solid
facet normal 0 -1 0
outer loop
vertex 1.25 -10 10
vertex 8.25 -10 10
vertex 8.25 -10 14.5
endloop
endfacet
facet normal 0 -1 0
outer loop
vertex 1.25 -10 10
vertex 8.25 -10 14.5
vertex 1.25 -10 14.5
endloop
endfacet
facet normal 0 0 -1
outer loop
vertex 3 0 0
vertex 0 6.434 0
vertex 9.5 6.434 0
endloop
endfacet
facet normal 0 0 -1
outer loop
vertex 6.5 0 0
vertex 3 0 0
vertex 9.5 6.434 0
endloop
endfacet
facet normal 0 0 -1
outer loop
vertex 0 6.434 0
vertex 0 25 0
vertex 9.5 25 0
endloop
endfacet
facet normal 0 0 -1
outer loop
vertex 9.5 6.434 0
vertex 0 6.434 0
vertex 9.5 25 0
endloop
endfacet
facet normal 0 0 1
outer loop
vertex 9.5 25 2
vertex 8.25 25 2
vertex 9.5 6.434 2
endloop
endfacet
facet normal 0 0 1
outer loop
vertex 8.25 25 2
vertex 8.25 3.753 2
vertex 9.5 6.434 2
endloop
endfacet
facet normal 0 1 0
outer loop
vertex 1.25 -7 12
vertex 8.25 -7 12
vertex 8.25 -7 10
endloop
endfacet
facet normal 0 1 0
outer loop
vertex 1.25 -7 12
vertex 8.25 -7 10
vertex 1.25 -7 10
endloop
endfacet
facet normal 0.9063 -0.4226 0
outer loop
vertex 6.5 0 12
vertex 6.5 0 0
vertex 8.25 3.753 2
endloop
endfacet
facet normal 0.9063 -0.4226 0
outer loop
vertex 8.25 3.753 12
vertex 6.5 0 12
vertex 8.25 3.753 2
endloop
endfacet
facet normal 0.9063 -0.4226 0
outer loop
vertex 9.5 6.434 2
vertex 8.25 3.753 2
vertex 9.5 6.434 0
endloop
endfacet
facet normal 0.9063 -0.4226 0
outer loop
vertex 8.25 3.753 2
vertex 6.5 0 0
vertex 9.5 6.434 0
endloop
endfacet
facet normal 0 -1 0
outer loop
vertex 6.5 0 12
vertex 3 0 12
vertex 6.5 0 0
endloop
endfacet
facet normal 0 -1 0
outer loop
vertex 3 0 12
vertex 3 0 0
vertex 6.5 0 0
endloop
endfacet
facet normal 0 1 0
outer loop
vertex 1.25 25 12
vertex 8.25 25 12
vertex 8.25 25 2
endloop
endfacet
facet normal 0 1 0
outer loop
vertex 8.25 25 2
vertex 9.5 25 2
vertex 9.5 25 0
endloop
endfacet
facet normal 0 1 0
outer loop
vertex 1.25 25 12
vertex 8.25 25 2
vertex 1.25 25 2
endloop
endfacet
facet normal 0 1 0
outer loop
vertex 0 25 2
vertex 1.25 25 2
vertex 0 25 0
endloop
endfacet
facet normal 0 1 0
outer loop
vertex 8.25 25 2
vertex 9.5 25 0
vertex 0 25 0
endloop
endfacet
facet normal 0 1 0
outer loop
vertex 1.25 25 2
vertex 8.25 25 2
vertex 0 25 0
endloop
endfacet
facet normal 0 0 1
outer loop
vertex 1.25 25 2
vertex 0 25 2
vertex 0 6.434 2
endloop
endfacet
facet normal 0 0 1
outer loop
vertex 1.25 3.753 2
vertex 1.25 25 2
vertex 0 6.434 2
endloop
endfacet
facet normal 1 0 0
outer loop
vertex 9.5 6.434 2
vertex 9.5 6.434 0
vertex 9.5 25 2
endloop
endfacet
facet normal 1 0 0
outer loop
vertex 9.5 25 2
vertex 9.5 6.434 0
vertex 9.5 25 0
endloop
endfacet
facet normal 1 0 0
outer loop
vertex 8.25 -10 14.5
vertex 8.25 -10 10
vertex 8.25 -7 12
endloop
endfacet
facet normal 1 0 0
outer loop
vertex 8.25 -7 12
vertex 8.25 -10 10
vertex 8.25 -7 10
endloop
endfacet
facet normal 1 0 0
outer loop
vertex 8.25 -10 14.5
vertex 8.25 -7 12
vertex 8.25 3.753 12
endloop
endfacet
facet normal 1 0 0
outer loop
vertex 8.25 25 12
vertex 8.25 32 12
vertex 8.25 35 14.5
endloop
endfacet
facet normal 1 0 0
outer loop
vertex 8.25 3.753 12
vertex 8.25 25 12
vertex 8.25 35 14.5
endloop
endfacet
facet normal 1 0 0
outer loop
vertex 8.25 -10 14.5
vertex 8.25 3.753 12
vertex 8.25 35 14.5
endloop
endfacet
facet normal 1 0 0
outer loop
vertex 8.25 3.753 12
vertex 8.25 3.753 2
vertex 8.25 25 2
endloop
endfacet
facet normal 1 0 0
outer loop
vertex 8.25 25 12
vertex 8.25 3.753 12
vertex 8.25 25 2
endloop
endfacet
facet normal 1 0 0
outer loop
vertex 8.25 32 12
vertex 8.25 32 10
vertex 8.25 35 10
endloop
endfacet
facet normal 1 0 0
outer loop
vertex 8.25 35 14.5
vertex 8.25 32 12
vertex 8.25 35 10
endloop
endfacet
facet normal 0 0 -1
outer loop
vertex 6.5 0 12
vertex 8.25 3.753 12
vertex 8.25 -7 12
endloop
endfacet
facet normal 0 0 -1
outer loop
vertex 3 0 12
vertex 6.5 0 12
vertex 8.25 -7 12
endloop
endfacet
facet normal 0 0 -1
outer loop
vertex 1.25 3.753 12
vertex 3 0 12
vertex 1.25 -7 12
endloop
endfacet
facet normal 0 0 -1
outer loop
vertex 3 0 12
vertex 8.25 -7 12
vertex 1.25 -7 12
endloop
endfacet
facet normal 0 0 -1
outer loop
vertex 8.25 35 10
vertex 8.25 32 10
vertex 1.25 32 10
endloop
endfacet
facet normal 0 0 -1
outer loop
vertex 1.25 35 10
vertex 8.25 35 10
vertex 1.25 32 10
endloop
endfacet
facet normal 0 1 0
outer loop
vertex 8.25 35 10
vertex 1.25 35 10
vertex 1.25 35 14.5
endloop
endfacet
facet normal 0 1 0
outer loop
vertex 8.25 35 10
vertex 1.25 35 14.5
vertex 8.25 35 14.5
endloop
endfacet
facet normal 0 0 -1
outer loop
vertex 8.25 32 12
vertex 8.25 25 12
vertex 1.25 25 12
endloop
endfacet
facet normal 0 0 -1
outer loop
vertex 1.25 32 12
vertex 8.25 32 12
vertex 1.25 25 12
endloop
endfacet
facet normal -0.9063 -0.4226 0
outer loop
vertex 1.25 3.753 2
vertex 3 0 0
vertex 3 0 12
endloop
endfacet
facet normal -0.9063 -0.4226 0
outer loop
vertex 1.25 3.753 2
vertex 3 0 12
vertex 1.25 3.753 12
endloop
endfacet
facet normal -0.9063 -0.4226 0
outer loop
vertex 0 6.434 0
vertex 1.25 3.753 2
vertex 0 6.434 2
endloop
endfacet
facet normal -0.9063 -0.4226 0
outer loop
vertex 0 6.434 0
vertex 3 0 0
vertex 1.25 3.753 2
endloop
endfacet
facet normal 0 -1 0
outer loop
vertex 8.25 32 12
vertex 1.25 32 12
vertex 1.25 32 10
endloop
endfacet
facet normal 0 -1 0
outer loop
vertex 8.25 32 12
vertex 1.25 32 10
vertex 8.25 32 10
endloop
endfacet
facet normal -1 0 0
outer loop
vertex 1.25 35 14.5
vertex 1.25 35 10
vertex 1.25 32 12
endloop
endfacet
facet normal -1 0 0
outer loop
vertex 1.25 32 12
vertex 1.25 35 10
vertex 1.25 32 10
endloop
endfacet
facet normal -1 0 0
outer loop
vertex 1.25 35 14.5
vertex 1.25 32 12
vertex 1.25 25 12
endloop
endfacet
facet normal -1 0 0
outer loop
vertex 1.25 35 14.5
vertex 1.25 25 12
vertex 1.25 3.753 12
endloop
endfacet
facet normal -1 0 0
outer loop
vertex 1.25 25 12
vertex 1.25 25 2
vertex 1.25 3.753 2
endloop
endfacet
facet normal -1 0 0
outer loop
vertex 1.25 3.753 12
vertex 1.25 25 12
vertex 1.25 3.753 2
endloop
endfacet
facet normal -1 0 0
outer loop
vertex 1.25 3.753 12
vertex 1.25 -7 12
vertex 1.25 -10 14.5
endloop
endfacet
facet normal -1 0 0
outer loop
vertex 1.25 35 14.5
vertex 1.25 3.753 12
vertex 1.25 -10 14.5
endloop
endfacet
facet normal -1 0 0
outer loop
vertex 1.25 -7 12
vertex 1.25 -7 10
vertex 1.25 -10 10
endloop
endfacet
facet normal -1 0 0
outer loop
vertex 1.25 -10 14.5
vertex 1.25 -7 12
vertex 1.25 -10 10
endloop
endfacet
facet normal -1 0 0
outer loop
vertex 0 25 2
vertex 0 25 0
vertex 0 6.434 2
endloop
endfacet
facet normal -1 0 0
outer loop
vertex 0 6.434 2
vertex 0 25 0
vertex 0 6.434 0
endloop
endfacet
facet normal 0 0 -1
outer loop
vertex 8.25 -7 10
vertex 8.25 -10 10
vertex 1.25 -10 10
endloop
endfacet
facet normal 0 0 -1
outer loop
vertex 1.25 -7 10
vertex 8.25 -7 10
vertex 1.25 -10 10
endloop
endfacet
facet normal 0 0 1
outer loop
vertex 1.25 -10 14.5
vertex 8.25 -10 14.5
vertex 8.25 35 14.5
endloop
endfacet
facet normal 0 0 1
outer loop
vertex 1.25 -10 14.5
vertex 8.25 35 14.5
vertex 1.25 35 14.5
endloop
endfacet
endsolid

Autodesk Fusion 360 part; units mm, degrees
sketch "Sketch1" plane through (0, 0, 0) normal (0, 0, 1) x (1, 0, 0)
  line L0 (0, 0) -> (9.5, 0)
  line L1 (9.5, 0) -> (9.5, 25)
  line L2 (9.5, 25) -> (0, 25)
  line L3 (0, 25) -> (0, 0)
  line L4 (1.25, 25) -> (8.25, 25)
  line L5 (8.25, 25) -> (8.25, 0)
  line L6 (8.25, 0) -> (1.25, 0)
  line L7 (1.25, 0) -> (1.25, 25)
  line L8 (3, 0) -> (0, 6.4335)
  line L9 (3, 0) -> (6, 0) construction
  line L10 (6.5, 0) -> (9.5, 6.4335)
  dimension "d1" = 9.5
  dimension "d2" = 25
  dimension "d3" = 7
  dimension "d4" = 1.25
  dimension "d11" = 3
  dimension "d12" = 3
  dimension "d13" = 65
  dimension "d14" = 65
extrude "Extrude1" add sketch "Sketch1" along normal blind 2 contours L2 L3 L7 L8 | L0 L2 L4 L5 L6 L7 L8 L10 | L1 L2 L5 L10
extrude "Extrude2" add sketch "Sketch1" along normal blind 12 contours L0 L2 L4 L5 L6 L7 L8 L10
sketch "Sketch3" plane through (0, 0, 12) normal (0, 0, 1) x (-1, 0, 0)
  line L0 (-3, 0) -> (-6.5, 0)
  line L1 (-6.5, 0) -> (-8.25, -3.7529)
  line L2 (-8.25, -3.7529) -> (-8.25, -25)
  line L3 (-8.25, -25) -> (-1.25, -25)
  line L4 (-1.25, -25) -> (-1.25, -3.7529)
  line L5 (-1.25, -3.7529) -> (-3, 0)
  line L6 (-1.25, -35) -> (-8.25, -35)
  line L7 (-8.25, -35) -> (-8.25, 10)
  line L8 (-8.25, 10) -> (-1.25, 10)
  line L9 (-1.25, 10) -> (-1.25, -35)
  line L10 (-8.25, -35) -> (-1.25, -35)
  line L11 (-1.25, -35) -> (-1.25, -32)
  line L12 (-1.25, -32) -> (-8.25, -32)
  line L13 (-8.25, -32) -> (-8.25, -35)
  line L14 (-1.25, 10) -> (-8.25, 10)
  line L15 (-8.25, 10) -> (-8.25, 7)
  line L16 (-8.25, 7) -> (-1.25, 7)
  line L17 (-1.25, 7) -> (-1.25, 10)
  dimension "d25" = 10
  dimension "d26" = 10
  dimension "d27" = 3
  dimension "d28" = 3
extrude "Extrude3" add sketch "Sketch3" along normal blind 2.5
extrude "Extrude4" add sketch "Sketch3" against normal blind 2 contours L7 L8 L9 L14 L15 L16 L17 | L6 L7 L9 L10 L11 L12 L13
